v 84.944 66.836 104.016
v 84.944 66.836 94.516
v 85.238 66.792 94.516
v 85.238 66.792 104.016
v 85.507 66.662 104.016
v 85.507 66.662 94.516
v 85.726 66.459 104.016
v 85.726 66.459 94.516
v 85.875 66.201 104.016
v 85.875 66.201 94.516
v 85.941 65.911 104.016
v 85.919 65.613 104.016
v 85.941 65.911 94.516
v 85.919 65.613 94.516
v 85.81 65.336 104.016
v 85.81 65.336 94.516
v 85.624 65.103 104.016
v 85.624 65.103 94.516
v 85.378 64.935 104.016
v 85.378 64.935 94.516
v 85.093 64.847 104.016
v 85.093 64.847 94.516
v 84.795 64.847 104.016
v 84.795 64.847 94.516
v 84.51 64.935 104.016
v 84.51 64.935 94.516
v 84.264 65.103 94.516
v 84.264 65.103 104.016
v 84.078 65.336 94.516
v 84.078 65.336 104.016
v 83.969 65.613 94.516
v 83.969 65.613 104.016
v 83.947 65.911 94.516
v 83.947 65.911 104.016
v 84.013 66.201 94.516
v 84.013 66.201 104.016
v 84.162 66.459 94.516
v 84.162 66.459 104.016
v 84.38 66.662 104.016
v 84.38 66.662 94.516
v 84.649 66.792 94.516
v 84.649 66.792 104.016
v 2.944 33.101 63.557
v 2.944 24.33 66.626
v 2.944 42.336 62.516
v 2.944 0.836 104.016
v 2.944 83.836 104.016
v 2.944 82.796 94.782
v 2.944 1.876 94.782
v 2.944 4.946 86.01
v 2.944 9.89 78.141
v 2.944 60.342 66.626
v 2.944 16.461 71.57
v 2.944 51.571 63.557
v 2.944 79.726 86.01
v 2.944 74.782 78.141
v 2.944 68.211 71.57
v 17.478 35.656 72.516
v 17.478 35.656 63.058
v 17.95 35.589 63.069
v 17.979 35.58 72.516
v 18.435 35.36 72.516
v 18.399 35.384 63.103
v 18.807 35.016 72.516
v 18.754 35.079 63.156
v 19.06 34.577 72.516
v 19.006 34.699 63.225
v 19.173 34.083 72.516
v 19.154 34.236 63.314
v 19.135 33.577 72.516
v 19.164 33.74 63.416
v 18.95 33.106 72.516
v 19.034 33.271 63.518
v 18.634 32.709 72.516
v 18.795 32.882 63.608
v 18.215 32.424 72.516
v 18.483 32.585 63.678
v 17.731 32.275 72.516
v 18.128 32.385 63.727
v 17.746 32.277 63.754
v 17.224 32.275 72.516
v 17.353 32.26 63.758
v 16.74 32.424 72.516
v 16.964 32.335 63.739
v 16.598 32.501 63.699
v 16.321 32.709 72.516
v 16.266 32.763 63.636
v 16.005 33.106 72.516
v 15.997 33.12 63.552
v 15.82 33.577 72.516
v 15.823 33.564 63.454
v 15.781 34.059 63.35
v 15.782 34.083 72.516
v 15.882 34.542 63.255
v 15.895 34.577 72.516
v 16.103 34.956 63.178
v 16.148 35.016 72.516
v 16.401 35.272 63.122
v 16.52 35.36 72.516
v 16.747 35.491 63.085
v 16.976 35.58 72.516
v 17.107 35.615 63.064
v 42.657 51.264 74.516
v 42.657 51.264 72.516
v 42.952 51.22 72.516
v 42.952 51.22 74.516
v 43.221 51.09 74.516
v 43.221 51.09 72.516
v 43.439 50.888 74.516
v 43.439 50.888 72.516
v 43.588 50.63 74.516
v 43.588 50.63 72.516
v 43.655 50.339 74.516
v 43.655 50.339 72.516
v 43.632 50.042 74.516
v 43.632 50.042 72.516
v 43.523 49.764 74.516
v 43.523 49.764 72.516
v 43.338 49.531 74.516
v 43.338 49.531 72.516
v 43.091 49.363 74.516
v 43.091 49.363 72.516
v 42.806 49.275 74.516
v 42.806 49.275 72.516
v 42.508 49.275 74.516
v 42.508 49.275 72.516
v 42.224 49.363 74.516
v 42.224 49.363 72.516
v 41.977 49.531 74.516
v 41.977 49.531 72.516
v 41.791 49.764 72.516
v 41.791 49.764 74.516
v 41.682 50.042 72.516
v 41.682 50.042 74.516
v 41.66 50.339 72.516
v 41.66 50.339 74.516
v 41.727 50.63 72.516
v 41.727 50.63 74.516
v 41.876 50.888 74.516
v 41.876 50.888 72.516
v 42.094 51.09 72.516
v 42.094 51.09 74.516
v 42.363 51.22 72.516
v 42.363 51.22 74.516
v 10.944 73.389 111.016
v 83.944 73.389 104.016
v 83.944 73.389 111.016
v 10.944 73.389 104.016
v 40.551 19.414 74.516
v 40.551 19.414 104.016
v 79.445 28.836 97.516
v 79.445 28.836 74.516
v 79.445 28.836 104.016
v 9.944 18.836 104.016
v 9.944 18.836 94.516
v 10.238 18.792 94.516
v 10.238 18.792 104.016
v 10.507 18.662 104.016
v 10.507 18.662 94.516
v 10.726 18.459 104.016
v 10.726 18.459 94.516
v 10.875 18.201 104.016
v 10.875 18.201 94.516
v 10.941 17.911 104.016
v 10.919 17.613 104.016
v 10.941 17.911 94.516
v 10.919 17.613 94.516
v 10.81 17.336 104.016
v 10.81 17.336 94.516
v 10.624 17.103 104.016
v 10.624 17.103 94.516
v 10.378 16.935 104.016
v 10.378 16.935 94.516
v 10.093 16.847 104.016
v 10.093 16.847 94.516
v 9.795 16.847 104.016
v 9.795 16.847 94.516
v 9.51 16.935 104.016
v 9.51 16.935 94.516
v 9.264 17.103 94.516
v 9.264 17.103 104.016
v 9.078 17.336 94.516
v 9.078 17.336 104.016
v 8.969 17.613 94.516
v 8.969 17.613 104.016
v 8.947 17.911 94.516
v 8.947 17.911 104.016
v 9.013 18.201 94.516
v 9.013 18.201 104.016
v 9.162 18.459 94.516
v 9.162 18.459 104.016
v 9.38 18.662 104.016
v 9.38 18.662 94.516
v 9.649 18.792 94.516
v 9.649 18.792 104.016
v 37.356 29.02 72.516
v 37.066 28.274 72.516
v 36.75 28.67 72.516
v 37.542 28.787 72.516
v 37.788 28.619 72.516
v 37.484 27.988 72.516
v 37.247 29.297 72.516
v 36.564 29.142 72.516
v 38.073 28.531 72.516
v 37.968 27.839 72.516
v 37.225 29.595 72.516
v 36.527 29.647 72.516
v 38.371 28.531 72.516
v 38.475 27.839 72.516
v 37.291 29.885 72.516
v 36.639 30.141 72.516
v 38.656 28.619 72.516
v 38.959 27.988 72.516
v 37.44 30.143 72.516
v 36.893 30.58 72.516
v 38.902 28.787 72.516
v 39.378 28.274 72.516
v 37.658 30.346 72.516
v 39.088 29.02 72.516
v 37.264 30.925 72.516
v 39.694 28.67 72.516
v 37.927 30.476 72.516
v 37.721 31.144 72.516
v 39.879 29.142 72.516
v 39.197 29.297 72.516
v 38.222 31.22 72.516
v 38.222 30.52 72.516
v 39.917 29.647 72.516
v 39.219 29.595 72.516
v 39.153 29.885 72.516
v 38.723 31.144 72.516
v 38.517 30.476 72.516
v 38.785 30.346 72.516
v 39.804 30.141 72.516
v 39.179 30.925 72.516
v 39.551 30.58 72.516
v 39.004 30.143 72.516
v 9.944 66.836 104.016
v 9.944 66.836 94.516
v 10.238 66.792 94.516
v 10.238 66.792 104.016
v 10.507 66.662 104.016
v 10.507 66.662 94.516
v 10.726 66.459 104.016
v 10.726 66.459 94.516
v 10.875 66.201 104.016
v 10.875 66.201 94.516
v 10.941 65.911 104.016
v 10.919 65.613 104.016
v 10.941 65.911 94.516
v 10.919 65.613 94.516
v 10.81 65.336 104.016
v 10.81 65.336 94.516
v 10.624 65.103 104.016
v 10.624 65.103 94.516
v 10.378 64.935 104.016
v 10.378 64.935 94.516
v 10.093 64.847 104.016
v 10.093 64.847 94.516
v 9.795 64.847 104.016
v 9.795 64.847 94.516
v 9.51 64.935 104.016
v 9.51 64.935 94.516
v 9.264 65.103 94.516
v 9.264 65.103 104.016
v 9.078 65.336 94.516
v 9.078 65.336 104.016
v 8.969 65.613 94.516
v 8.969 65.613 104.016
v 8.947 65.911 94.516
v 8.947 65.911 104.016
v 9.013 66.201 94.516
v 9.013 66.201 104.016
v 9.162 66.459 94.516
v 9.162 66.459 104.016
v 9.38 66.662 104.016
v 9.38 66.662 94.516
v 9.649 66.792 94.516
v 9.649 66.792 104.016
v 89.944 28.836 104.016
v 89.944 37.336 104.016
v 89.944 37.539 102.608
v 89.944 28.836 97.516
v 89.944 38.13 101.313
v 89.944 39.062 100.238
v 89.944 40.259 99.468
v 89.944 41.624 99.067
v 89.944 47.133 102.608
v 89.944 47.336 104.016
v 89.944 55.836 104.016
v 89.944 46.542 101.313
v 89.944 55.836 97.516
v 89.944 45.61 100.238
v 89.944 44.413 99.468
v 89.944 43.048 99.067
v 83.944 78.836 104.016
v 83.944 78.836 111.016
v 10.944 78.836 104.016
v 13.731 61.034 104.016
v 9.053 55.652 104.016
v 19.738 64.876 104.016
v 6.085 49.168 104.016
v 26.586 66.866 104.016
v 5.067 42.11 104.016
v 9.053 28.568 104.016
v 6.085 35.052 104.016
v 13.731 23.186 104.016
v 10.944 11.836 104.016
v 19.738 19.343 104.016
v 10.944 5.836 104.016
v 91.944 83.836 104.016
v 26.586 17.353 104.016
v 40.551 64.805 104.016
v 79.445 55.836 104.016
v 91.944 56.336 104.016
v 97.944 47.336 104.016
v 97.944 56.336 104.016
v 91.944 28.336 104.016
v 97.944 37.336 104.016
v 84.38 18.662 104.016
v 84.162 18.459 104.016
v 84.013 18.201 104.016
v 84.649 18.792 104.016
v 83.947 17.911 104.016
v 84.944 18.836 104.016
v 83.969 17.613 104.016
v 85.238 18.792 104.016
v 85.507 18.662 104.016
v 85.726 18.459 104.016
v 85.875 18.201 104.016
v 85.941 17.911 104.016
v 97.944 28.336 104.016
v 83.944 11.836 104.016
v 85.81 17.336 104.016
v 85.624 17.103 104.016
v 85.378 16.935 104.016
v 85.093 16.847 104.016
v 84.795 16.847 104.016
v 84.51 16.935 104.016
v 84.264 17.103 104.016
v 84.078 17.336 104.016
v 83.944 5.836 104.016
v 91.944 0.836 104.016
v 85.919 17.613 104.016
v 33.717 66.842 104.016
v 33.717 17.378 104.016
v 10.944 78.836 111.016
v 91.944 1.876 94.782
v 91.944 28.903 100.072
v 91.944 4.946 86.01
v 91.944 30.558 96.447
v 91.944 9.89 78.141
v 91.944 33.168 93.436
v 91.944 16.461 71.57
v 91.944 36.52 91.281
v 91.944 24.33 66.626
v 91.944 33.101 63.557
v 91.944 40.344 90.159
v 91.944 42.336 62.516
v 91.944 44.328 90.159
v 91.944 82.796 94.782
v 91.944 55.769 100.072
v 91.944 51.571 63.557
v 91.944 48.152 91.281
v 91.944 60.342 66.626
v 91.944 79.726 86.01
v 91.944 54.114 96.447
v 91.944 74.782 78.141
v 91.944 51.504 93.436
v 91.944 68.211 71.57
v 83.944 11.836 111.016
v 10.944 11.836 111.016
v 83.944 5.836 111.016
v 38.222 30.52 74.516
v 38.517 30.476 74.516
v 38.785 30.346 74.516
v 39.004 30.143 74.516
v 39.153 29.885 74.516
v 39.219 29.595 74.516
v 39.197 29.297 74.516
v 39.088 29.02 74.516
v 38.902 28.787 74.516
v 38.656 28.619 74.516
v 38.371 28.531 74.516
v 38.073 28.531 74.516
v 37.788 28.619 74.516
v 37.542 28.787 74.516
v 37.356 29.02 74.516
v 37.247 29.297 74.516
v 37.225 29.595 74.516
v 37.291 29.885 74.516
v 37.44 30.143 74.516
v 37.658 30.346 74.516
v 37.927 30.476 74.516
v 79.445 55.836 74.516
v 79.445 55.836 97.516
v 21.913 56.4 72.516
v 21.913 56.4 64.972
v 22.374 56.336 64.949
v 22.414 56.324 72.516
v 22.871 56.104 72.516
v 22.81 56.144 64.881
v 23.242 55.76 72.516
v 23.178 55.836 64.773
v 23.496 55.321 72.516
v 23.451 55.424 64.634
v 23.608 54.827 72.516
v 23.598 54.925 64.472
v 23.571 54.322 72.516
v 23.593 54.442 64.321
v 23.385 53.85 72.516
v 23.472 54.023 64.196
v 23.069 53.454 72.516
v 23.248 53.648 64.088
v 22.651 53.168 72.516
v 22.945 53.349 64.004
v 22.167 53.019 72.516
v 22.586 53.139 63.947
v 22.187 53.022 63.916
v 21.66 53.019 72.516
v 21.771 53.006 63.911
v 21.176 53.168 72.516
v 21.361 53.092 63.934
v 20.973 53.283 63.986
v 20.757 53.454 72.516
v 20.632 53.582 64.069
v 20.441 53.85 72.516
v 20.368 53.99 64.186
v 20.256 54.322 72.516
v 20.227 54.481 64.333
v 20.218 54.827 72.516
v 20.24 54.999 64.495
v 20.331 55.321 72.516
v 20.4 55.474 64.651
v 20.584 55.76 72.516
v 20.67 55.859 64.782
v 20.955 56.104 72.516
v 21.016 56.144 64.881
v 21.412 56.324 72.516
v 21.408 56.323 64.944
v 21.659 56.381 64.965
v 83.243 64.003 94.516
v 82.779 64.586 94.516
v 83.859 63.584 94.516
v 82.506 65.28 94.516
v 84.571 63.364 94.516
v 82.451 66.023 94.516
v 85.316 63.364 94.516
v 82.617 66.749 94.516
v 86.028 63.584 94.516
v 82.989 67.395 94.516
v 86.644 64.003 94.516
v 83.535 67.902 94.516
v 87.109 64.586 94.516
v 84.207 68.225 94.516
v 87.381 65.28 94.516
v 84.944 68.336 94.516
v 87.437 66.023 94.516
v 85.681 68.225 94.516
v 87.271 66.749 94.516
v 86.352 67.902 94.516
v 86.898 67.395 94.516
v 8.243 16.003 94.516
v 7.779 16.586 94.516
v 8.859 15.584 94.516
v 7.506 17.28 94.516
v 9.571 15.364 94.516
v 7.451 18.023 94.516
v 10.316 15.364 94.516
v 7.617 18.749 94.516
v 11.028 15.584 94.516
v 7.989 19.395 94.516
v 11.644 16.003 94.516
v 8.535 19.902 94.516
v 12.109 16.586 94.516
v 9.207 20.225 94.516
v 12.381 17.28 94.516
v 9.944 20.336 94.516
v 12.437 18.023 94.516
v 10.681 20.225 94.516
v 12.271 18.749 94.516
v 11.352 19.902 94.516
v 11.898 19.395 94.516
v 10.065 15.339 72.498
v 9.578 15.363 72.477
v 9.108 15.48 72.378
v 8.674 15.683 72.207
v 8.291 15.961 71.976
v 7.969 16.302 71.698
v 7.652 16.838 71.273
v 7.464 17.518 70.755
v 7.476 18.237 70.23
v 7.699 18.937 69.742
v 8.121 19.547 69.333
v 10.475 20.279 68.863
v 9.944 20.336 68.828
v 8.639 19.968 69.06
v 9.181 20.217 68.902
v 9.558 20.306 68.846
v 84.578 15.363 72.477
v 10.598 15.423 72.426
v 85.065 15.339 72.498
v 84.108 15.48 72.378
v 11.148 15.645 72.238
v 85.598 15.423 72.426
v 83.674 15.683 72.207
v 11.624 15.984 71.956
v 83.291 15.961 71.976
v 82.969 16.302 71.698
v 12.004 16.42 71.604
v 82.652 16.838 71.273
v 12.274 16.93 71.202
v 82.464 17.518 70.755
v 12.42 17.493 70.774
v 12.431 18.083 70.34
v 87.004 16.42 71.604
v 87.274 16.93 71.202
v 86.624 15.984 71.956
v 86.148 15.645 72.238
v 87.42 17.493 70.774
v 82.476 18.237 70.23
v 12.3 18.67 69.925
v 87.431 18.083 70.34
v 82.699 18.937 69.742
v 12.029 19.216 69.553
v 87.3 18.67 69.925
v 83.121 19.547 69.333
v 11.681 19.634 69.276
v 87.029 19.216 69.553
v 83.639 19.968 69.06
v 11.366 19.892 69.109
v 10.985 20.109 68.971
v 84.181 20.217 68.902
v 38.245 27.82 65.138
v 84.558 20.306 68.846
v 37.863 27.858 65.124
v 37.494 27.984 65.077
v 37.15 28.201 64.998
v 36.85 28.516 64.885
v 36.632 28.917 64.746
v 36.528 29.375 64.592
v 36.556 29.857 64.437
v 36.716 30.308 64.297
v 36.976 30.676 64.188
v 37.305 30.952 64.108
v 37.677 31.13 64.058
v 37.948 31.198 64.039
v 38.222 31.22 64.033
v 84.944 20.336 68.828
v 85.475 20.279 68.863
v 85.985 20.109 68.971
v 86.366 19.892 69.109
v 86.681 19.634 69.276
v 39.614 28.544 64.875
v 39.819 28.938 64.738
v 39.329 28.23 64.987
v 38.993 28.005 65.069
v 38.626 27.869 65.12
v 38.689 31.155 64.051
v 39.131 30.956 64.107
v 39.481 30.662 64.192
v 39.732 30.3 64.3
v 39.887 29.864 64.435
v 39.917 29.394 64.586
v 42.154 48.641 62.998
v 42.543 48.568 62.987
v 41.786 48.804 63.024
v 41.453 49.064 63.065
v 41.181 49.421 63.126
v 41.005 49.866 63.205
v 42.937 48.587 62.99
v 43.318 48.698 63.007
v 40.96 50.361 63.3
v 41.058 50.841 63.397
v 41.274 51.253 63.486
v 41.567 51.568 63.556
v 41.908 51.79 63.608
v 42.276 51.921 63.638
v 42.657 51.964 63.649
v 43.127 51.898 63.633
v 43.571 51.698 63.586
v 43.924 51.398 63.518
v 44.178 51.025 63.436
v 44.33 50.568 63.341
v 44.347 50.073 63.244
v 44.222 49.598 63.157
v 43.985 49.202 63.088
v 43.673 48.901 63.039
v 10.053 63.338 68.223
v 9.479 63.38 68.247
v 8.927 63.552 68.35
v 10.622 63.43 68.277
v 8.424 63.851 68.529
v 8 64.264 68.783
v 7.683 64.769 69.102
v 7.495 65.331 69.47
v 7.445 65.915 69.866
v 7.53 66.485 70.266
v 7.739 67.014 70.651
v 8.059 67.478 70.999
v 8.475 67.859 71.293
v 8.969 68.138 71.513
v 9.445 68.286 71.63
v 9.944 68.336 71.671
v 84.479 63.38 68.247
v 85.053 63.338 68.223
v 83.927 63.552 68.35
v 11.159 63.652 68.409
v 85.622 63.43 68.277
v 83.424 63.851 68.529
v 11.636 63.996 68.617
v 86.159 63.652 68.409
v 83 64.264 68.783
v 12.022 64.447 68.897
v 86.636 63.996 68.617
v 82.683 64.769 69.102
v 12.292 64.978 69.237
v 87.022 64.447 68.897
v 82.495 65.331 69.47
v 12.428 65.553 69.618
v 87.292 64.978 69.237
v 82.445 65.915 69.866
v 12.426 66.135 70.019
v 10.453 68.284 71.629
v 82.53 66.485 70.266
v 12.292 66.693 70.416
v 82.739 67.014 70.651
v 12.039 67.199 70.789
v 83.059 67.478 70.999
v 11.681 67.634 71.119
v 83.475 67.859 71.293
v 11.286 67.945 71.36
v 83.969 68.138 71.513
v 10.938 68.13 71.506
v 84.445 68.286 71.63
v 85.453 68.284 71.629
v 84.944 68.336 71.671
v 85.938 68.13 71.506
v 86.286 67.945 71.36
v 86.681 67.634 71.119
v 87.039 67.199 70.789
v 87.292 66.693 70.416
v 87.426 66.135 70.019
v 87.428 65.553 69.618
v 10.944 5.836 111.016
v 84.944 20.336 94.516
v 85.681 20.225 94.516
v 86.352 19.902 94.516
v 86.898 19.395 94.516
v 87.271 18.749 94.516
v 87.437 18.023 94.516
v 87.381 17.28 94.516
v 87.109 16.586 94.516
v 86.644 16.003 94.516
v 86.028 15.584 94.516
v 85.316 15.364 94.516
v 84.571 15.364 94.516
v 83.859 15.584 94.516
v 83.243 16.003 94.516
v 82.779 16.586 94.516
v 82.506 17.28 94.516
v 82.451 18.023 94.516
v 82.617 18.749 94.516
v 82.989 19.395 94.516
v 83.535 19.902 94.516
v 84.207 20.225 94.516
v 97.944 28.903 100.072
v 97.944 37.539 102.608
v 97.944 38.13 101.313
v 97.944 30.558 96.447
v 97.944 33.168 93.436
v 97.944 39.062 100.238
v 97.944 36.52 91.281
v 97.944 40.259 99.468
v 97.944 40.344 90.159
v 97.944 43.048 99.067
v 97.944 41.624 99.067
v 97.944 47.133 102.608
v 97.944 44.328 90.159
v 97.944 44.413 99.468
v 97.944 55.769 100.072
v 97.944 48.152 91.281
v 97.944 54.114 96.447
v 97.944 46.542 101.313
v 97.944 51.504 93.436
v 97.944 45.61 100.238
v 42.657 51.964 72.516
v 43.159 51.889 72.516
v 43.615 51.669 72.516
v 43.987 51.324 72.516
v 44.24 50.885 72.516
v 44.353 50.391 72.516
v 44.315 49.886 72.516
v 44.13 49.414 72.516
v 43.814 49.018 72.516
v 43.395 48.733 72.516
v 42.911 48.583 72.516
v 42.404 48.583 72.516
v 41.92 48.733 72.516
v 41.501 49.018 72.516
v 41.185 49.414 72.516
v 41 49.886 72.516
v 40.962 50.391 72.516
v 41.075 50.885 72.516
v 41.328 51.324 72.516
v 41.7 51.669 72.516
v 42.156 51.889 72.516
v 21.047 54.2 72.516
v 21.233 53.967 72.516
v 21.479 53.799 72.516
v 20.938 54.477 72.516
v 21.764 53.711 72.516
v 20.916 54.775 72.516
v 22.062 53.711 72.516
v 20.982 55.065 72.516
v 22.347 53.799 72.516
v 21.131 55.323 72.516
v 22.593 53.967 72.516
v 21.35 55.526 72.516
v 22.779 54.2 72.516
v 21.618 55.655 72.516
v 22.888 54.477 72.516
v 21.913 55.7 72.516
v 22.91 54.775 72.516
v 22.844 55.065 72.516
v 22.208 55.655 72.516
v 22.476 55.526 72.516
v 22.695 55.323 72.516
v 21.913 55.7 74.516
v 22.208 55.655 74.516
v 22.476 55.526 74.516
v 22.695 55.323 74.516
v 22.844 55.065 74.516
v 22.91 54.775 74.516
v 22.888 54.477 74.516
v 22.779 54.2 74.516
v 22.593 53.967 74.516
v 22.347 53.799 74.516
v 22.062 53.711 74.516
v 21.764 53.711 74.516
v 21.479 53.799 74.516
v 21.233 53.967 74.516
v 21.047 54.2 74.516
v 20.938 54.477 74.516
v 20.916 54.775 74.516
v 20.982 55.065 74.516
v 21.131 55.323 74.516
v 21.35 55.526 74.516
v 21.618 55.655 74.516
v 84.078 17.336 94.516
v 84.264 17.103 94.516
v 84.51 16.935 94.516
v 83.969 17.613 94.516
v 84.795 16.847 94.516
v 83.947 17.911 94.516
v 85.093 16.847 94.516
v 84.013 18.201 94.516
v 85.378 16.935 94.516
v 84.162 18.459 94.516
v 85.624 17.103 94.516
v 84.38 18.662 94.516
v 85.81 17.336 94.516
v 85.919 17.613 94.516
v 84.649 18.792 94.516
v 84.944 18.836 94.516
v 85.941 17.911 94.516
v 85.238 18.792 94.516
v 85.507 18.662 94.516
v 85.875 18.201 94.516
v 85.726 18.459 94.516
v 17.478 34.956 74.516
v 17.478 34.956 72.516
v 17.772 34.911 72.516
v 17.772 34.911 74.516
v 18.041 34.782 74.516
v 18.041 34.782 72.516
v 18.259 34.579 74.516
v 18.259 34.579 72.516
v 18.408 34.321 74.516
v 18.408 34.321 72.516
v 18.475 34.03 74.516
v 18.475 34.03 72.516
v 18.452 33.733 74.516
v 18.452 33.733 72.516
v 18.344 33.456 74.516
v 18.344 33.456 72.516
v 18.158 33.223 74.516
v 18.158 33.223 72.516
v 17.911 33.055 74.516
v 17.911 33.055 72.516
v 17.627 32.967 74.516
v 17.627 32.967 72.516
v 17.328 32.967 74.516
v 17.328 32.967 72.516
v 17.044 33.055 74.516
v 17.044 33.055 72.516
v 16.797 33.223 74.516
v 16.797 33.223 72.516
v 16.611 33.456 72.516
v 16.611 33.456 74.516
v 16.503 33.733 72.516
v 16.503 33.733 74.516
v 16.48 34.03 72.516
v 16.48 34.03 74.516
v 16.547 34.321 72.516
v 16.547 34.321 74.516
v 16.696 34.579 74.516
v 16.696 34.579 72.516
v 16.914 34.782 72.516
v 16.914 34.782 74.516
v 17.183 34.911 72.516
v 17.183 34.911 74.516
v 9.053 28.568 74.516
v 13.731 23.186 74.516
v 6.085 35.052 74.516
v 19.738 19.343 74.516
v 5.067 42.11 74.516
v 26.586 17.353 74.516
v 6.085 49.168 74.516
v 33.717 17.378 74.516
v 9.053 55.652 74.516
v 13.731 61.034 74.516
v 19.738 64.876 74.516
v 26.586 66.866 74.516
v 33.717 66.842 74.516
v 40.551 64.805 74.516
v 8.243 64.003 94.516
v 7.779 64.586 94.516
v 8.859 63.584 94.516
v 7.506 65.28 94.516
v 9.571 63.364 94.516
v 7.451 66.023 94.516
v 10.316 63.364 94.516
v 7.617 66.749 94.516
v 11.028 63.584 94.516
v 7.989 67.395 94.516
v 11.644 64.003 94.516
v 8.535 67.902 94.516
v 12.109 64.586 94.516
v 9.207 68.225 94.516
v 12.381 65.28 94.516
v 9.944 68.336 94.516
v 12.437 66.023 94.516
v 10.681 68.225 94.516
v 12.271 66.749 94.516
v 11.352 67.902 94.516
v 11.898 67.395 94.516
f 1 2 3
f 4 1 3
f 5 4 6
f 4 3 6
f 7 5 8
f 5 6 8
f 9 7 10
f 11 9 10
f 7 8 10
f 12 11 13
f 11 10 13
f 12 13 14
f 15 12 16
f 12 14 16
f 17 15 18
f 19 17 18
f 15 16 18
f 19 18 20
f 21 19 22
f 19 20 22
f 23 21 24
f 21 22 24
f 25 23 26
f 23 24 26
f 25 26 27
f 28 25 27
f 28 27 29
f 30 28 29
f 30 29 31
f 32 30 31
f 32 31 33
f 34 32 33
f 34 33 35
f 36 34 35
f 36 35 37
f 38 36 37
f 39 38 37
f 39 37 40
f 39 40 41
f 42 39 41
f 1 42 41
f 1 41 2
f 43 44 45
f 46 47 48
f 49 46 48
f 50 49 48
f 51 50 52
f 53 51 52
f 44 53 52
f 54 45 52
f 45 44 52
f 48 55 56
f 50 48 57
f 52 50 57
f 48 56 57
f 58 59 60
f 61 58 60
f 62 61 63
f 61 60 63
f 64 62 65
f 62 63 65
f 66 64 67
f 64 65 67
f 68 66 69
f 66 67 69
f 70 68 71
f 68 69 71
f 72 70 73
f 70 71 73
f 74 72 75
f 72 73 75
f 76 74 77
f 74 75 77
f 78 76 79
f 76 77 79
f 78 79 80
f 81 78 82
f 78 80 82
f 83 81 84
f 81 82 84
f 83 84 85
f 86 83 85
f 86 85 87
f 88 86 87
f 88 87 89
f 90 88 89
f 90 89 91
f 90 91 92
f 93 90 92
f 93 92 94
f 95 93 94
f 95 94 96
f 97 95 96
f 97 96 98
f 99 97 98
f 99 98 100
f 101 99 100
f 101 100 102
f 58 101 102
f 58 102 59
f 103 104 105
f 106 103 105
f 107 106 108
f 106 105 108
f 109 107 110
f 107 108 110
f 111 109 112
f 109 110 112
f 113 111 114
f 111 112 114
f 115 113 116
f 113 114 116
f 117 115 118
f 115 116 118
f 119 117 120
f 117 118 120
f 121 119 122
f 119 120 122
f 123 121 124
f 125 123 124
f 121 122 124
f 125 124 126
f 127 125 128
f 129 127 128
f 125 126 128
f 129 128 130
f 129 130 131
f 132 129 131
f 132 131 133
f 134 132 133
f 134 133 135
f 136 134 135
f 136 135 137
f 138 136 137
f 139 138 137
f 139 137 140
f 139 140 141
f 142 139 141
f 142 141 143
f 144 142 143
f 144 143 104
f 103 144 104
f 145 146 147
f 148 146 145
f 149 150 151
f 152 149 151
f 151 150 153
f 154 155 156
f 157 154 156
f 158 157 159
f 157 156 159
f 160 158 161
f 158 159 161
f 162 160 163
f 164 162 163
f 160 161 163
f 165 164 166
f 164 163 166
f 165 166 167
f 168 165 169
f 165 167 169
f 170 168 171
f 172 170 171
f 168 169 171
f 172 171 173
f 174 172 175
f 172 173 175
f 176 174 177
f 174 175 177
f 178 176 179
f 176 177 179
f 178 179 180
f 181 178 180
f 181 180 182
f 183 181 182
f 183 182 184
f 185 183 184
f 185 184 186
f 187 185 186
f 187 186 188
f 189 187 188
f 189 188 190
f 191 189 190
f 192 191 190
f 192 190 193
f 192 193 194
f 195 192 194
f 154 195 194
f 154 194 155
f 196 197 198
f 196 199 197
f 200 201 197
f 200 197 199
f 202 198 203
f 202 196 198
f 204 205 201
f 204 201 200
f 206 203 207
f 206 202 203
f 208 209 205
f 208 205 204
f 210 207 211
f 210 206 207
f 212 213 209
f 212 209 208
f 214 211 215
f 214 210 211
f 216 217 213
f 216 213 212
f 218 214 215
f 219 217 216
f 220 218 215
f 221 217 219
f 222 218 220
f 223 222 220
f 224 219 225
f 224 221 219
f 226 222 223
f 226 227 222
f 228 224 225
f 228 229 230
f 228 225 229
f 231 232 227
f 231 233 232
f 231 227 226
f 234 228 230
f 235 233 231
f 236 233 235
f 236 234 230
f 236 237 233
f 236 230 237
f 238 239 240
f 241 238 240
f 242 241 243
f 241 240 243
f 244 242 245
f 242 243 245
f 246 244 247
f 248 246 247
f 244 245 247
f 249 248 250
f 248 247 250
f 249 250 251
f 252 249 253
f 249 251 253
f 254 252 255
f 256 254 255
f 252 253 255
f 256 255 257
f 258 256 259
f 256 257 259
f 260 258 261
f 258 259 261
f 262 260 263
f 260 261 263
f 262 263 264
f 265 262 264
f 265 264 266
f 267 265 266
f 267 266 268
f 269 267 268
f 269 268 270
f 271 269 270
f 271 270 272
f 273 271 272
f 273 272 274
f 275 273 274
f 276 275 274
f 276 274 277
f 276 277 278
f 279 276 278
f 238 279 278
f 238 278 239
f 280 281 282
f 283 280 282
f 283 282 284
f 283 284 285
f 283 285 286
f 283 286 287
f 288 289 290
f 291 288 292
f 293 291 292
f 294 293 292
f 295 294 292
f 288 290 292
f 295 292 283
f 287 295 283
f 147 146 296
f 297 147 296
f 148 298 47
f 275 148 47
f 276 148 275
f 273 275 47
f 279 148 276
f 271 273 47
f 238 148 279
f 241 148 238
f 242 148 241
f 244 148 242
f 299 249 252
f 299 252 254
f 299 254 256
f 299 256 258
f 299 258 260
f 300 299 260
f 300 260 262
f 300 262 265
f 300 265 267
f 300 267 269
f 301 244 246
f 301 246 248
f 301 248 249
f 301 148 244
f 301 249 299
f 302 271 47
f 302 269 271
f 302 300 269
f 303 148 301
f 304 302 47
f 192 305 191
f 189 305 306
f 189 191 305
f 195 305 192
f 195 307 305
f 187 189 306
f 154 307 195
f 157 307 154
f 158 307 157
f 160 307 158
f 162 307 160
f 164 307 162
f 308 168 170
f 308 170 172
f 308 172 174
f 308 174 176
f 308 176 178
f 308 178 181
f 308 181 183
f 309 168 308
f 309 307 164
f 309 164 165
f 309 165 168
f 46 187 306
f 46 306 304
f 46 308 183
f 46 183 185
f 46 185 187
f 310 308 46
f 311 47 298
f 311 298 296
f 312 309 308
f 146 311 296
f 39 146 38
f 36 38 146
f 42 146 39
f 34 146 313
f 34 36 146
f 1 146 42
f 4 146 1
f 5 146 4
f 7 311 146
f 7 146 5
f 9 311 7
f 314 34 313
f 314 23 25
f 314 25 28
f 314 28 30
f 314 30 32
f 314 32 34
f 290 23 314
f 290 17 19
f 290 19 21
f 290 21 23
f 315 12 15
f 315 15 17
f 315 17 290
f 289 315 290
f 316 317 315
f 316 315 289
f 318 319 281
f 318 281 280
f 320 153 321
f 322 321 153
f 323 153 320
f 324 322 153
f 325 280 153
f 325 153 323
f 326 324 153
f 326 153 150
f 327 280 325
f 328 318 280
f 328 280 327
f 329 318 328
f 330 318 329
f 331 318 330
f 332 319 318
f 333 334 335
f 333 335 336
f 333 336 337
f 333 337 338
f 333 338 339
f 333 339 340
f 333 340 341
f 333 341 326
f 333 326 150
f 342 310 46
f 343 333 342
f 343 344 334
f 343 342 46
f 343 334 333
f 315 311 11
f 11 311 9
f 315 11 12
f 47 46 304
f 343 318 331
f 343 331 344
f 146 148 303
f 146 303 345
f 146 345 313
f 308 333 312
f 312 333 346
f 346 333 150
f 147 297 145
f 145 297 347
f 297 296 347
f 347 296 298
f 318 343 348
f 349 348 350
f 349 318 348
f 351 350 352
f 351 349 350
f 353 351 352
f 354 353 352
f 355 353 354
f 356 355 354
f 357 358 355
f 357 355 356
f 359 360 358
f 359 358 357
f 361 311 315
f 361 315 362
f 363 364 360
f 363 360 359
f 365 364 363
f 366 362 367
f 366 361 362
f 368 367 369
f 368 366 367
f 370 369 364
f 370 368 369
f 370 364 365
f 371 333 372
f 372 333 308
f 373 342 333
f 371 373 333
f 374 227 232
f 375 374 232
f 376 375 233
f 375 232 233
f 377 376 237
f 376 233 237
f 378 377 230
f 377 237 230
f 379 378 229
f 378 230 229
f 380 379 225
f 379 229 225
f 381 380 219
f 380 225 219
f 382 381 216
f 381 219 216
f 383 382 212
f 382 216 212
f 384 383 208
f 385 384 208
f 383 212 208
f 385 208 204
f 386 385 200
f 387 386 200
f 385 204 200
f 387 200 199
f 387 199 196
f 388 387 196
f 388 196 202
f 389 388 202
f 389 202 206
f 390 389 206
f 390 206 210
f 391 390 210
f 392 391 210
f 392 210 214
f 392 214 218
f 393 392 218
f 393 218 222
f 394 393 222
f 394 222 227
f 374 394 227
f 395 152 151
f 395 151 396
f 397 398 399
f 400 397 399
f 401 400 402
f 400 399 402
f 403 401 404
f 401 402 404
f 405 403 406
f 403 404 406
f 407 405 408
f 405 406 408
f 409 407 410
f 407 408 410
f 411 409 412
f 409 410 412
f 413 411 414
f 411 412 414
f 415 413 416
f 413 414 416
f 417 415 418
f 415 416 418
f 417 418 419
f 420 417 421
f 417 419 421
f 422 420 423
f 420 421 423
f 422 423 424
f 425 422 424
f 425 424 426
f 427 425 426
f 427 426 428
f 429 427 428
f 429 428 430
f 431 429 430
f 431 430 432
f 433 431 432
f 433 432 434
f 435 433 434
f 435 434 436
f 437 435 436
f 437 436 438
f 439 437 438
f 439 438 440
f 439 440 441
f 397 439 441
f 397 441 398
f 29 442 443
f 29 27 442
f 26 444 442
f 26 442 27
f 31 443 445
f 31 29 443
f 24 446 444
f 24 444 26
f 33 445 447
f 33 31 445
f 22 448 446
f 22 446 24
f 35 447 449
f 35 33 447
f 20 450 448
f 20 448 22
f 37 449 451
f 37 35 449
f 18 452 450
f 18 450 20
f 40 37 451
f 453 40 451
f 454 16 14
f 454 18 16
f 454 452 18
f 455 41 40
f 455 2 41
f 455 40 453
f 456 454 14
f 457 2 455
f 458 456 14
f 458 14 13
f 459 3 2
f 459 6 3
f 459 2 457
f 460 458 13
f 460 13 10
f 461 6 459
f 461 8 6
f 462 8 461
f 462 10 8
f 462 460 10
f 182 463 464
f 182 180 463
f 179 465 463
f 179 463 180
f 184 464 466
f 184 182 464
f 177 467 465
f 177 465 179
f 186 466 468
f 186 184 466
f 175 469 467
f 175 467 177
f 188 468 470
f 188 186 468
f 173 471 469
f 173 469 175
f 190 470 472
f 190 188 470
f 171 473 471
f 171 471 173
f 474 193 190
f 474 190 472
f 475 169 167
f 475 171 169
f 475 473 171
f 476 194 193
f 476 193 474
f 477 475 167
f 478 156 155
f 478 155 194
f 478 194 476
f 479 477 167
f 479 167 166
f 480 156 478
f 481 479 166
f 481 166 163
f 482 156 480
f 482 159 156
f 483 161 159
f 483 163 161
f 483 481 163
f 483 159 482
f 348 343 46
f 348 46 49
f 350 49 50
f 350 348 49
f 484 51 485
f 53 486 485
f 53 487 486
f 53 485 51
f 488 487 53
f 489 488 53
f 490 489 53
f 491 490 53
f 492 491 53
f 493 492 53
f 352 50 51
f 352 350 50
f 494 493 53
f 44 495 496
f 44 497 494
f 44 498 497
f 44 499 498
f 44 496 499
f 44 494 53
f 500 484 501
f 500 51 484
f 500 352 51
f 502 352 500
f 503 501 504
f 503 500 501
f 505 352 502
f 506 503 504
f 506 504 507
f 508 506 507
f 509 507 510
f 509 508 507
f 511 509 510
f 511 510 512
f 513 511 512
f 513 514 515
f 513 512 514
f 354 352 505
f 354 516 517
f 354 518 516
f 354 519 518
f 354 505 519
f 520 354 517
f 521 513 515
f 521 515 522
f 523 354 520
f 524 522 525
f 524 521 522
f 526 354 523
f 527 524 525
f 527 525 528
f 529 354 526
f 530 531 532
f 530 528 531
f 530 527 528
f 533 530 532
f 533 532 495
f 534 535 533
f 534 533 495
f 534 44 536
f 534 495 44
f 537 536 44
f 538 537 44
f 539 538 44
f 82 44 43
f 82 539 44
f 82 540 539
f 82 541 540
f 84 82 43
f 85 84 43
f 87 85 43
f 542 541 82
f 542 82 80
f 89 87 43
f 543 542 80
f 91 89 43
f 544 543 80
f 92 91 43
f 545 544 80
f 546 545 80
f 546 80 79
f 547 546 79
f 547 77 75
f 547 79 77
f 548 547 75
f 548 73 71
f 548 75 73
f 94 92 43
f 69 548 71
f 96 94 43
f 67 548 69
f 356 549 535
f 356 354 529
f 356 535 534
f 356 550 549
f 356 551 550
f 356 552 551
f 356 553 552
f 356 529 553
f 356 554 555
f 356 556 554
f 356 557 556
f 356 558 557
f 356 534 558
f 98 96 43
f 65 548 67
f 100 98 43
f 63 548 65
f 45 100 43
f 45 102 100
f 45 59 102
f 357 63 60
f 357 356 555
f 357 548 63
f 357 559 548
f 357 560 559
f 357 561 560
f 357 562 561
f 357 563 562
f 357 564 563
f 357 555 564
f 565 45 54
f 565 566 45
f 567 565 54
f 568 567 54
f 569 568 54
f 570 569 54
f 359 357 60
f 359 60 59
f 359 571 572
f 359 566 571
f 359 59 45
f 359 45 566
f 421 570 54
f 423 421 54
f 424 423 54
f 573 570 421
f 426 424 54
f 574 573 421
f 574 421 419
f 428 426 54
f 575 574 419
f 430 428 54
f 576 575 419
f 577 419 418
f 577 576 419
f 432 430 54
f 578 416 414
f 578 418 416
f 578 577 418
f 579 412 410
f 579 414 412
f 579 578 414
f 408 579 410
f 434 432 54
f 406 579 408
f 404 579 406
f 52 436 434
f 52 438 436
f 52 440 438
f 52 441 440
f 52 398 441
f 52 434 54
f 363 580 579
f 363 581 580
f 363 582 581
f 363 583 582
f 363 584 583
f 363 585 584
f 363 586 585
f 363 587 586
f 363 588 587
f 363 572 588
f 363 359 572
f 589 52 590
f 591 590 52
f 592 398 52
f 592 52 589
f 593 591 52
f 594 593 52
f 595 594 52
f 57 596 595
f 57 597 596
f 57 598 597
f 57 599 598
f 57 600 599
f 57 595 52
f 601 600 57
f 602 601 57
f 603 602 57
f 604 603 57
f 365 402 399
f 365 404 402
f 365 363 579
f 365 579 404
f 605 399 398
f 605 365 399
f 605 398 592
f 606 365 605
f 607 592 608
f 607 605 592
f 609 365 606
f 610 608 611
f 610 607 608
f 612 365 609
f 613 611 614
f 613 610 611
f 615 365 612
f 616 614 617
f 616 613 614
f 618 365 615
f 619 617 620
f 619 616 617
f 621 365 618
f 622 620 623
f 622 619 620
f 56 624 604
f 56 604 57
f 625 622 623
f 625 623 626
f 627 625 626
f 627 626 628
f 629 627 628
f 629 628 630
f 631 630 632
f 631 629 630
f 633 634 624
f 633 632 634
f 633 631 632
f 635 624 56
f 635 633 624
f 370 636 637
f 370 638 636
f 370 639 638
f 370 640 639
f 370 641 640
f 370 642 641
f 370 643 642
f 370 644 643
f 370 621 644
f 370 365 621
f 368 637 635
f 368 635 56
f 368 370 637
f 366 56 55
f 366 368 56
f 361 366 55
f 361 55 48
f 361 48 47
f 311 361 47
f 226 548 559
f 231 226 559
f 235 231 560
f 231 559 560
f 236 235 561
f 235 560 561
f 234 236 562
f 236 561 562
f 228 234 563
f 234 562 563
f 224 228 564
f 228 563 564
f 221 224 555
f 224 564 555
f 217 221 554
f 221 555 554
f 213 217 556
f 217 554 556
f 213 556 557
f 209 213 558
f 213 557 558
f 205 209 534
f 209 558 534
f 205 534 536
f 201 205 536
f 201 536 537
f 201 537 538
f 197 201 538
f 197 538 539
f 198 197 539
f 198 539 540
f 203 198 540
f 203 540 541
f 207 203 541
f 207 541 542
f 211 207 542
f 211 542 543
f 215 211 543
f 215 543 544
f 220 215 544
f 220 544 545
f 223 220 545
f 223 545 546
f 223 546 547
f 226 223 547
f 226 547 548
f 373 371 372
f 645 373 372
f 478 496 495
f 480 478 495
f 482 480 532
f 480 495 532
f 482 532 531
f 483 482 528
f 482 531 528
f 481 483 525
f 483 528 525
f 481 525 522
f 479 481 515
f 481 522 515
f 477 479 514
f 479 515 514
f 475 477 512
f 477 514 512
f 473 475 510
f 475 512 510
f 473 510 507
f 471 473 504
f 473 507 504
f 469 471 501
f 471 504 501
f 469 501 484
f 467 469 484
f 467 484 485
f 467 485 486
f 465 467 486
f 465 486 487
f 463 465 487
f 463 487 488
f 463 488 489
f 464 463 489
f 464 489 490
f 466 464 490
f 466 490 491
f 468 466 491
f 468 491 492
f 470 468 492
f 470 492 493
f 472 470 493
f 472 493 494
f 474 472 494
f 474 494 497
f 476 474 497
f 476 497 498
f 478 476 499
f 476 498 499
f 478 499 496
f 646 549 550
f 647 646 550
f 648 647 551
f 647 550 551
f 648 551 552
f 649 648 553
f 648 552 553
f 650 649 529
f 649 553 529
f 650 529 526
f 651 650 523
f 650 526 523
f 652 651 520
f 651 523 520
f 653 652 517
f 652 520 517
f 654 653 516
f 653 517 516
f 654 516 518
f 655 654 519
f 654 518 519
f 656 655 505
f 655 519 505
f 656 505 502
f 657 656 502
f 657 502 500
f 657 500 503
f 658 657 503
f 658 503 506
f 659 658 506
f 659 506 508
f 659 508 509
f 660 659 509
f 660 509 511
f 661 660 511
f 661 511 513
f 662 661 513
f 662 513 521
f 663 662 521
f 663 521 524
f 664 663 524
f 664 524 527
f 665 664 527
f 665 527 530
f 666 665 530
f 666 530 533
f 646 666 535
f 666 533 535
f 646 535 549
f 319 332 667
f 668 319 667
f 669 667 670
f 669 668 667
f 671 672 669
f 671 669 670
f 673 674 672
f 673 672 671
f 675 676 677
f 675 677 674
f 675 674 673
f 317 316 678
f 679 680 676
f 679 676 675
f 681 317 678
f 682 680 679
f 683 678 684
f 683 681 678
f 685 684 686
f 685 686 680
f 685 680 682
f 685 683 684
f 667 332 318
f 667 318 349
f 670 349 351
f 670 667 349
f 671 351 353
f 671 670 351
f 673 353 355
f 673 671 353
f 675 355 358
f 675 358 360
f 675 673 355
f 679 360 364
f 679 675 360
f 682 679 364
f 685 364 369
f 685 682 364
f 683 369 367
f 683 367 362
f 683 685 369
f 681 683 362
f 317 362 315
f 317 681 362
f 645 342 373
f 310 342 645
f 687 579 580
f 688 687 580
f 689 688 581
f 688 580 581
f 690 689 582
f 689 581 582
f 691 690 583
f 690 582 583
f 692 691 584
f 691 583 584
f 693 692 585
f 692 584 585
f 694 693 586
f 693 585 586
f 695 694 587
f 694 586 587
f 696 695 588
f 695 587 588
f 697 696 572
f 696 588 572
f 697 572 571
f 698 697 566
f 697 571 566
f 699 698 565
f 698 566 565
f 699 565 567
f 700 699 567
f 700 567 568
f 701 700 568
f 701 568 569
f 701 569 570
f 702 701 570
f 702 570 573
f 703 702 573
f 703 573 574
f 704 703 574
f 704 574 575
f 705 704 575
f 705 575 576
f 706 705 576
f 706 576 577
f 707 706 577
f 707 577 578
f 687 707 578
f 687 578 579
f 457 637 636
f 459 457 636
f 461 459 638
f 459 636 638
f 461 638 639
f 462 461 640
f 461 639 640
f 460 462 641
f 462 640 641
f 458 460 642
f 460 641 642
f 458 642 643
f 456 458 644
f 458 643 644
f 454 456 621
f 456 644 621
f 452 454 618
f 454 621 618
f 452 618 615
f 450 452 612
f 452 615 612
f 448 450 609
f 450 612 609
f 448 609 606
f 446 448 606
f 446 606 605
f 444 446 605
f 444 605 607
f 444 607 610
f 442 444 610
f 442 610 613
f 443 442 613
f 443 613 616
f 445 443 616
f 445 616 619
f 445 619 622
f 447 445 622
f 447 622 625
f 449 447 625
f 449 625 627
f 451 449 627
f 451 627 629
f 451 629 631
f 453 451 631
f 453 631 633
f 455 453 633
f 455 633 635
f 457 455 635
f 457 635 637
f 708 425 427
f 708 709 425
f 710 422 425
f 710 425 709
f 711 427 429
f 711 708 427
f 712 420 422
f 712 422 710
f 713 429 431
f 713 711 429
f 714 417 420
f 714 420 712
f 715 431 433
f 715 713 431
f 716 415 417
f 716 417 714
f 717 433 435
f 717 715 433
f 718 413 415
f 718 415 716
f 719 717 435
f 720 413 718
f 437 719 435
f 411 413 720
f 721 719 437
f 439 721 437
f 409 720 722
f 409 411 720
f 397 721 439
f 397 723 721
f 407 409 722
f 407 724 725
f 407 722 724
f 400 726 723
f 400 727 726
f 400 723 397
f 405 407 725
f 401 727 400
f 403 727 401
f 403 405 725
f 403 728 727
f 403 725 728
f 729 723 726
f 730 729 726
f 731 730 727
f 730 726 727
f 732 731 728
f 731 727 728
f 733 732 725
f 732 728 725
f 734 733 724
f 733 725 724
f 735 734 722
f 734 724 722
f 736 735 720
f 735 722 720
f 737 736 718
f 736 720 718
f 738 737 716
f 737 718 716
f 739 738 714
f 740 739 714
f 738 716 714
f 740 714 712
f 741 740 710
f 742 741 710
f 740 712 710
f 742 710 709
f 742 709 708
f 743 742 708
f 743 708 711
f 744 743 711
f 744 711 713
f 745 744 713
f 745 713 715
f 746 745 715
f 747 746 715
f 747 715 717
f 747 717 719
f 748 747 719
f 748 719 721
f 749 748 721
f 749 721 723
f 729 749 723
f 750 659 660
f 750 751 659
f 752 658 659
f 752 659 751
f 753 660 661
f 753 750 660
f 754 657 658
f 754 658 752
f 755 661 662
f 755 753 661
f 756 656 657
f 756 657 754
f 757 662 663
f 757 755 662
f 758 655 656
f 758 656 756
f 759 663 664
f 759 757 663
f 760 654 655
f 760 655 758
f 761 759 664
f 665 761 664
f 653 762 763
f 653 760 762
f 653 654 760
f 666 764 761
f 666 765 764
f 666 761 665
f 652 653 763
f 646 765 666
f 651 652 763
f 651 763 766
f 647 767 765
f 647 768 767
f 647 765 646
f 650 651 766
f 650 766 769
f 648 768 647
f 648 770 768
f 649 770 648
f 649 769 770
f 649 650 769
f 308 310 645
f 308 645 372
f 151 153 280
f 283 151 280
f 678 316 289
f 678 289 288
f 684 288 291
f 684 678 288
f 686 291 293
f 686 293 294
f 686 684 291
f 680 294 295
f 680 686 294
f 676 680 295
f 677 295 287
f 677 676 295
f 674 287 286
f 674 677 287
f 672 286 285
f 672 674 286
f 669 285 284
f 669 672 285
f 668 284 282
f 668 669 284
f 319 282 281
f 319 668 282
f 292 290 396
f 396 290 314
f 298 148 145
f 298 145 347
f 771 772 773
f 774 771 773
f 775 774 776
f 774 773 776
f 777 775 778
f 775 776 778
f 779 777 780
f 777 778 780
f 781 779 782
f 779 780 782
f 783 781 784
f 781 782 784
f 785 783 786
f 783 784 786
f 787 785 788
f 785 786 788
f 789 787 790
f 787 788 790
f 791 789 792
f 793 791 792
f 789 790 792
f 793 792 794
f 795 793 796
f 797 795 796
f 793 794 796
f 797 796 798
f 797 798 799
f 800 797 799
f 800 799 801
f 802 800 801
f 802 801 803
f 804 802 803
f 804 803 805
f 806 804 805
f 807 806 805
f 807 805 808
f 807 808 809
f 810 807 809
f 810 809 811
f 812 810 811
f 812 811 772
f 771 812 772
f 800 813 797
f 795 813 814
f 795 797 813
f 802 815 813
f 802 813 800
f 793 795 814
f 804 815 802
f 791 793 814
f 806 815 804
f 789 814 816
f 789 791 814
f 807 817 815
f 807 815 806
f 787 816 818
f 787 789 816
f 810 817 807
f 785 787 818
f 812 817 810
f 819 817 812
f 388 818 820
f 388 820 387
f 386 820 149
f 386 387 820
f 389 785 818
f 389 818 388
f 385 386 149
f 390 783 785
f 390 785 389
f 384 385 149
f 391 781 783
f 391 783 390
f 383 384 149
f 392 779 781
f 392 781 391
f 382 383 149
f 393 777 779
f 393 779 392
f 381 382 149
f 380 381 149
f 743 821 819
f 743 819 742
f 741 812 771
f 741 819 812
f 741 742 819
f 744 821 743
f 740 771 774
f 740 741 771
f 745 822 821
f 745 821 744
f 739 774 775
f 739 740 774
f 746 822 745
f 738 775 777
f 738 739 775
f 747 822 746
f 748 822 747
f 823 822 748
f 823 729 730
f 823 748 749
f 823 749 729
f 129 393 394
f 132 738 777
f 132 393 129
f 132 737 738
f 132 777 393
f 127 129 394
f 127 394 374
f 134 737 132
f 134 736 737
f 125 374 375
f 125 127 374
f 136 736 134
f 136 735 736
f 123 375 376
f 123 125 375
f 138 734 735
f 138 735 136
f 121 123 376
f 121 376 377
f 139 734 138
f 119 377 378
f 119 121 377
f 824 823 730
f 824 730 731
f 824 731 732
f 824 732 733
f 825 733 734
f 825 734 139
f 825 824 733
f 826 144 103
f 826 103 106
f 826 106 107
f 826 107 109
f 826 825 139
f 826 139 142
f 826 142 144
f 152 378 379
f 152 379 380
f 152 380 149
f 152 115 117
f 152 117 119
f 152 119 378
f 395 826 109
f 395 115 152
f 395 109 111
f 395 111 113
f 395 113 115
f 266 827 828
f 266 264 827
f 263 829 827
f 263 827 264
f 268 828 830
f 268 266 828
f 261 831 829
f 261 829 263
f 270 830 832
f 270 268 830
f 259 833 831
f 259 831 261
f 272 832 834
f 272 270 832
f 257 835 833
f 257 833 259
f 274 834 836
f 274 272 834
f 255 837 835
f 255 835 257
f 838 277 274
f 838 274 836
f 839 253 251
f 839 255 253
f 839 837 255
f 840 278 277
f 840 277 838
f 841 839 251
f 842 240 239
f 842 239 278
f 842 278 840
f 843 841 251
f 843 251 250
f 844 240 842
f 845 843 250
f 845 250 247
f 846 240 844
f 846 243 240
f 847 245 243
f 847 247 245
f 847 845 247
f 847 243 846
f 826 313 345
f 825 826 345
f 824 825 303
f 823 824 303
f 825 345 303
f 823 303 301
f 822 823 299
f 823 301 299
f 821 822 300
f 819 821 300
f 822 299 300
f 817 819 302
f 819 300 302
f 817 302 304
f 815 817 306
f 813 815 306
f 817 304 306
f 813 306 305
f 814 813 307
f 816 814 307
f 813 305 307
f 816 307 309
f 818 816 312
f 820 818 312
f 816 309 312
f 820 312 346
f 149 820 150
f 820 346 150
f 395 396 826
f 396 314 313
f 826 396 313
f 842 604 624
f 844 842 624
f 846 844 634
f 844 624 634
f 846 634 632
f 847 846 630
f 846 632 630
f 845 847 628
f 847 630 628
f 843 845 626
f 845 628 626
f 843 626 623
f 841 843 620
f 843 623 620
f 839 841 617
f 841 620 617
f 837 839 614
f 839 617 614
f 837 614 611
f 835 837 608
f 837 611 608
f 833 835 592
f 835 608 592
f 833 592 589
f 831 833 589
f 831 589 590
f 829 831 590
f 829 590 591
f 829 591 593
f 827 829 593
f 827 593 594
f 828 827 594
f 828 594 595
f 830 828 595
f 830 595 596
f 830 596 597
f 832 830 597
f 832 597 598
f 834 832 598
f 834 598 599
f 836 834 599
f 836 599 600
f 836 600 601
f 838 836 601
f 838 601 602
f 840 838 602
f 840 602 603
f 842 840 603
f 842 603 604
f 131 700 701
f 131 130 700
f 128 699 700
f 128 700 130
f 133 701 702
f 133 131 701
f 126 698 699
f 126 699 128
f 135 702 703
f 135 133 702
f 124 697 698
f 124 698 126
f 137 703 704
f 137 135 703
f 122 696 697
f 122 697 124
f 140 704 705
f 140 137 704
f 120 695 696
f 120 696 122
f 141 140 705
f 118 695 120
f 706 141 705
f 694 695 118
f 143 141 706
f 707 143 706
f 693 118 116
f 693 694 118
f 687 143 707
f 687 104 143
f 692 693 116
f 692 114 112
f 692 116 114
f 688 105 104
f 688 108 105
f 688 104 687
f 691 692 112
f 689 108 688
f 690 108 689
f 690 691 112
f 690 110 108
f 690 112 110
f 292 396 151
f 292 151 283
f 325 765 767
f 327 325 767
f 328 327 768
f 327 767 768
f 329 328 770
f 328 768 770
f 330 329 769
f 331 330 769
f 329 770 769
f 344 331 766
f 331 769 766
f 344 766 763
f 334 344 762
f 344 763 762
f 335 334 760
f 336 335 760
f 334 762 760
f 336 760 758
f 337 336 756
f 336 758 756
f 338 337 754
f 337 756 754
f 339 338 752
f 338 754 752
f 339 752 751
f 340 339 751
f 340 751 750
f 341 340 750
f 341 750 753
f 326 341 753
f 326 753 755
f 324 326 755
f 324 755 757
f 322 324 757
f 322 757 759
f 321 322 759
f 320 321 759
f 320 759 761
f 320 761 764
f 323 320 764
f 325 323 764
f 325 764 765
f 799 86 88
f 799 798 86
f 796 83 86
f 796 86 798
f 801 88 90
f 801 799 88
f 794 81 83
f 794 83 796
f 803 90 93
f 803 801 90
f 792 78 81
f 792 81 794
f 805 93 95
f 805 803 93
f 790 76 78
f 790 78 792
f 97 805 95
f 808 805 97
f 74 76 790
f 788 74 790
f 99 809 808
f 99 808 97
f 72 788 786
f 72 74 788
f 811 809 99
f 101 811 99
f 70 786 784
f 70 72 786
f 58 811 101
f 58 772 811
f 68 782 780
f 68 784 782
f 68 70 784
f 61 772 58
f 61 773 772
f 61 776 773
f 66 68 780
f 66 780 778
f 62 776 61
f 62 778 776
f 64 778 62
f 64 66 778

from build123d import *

# Parameters (mm, degrees)
BOSS_EXTRUDE2_DEPTH = 87
CUT_EXTRUDE1_DEPTH  = 29.5
SKETCH3_R           = 1
CUT_EXTRUDE2_DEPTH  = 130.771336418
SKETCH4_R           = 1.7
CUT_EXTRUDE3_DEPTH  = 10
BOSS_EXTRUDE3_START = 2
BOSS_EXTRUDE3_DEPTH = 2
BOSS_EXTRUDE4_START = 6
BOSS_EXTRUDE4_DEPTH = 6
SKETCH7_W           = 73
SKETCH7_H           = 5.446782016
SKETCH7_H_2         = 6
CUT_EXTRUDE4_DEPTH  = 7
SKETCH8_R           = 1
CUT_EXTRUDE5_DEPTH  = 136.438914135
SKETCH9_R           = 2.5
CUT_EXTRUDE6_DEPTH  = 32
SKETCH11_W          = 10.498637593
SKETCH11_H          = 26.999999931
BOSS_EXTRUDE6_DEPTH = 23
SKETCH12_W          = 73
SKETCH12_H          = 6
SKETCH12_H_2        = 5.446782016
BOSS_EXTRUDE7_DEPTH = 14


with BuildPart() as part:
    # Sketch1 → Boss-Extrude2 (new body)
    with BuildSketch(Plane(origin=(89.94373008, 0, 0), x_dir=(0, 0, -1), z_dir=(1, 0, 0))):
        with BuildLine():
            Line((-104.016306216, 83.836001664), (-104.016306216, 0.836001664))
            ThreePointArc((-104.016306216, 0.836001664), (-62.516306216, 42.336001664), (-104.016306216, 83.836001664))
        make_face()
    extrude(amount=-BOSS_EXTRUDE2_DEPTH)

    # Sketch2 → Cut-Extrude1 (cut)
    with BuildSketch(Plane.XY.offset(104.016306216)):
        with BuildLine():
            Line((89.94373008, 55.836001595), (79.445092487, 55.836001664))
            Line((79.445092487, 55.836001664), (40.551337791, 64.805487997))
            ThreePointArc((40.551337791, 64.805487997), (5.067466824, 42.109927869), (40.551337791, 19.414367741))
            Line((40.551337791, 19.414367741), (79.445092487, 28.836001664))
            Line((79.445092487, 28.836001664), (89.94373008, 28.836001664))
            Line((89.94373008, 28.836001664), (89.94373008, 55.836001595))
        make_face()
    extrude(amount=-CUT_EXTRUDE1_DEPTH, mode=Mode.SUBTRACT)

    # Sketch3 → Cut-Extrude2 (cut, through all)
    with BuildSketch(Plane(origin=(0, 0, 62.516306216), x_dir=(-1, 0, 0), z_dir=(0, 0, -1))):
        with Locations(Location((-42.657418818, 50.264258545, 0), (0, 0, 90))):
            Circle(SKETCH3_R)
        with Locations(Location((-21.913136148, 54.699879864, 0), (0, 0, 90))):
            Circle(SKETCH3_R)
        with Locations(Location((-38.2217975, 29.519975875, 0), (0, 0, 90))):
            Circle(SKETCH3_R)
        with Locations(Location((-17.477514829, 33.955597193, 0), (0, 0, 90))):
            Circle(SKETCH3_R)
    extrude(amount=-CUT_EXTRUDE2_DEPTH, mode=Mode.SUBTRACT)

    # Sketch4 → Cut-Extrude3 (cut)
    with BuildSketch(Plane(origin=(0, 0, 62.516306216), x_dir=(-1, 0, 0), z_dir=(0, 0, -1))):
        with Locations(Location((-42.657418818, 50.264258545, 0), (0, 0, 90))):
            Circle(SKETCH4_R)
        with Locations(Location((-21.913136148, 54.699879864, 0), (0, 0, 90))):
            Circle(SKETCH4_R)
        with Locations(Location((-38.2217975, 29.519975875, 0), (0, 0, 90))):
            Circle(SKETCH4_R)
        with Locations(Location((-17.477514829, 33.955597193, 0), (0, 0, 90))):
            Circle(SKETCH4_R)
    extrude(amount=-CUT_EXTRUDE3_DEPTH, mode=Mode.SUBTRACT)

    # Sketch5 → Boss-Extrude3 (add)
    with BuildSketch(Plane(origin=(89.94373008, 0, 0), x_dir=(0, 0, -1), z_dir=(1, 0, 0)).offset(BOSS_EXTRUDE3_START)):
        with BuildLine():
            Line((-104.016306216, 55.836001595), (-104.016306216, 47.336001664))
            ThreePointArc((-104.016306216, 47.336001664), (-99.016306216, 42.336001664), (-104.016306216, 37.336001664))
            Line((-104.016306216, 37.336001664), (-104.016306216, 28.836001664))
            Line((-104.016306216, 28.836001664), (-104.016306216, 0.836001664))
            ThreePointArc((-104.016306216, 0.836001664), (-62.516306216, 42.336001664), (-104.016306216, 83.836001664))
            Line((-104.016306216, 83.836001664), (-104.016306216, 55.836001595))
        make_face()
    extrude(amount=-BOSS_EXTRUDE3_DEPTH)

    # Sketch6 → Boss-Extrude4 (add)
    with BuildSketch(Plane(origin=(91.94373008, 0, 0), x_dir=(0, 0, -1), z_dir=(1, 0, 0)).offset(BOSS_EXTRUDE4_START)):
        with BuildLine():
            Line((-104.016306216, 56.336001664), (-104.016306216, 47.336001664))
            ThreePointArc((-104.016306216, 47.336001664), (-99.016306216, 42.336001664), (-104.016306216, 37.336001664))
            Line((-104.016306216, 37.336001664), (-104.016306216, 28.336001664))
            ThreePointArc((-104.016306216, 28.336001664), (-90.016306216, 42.336001664), (-104.016306216, 56.336001664))
        make_face()
    extrude(amount=-BOSS_EXTRUDE4_DEPTH)

    # Sketch7 → Cut-Extrude4 (cut)
    with BuildSketch(Plane.XY.offset(104.016306216)):
        with Locations((47.44373008, 76.112610656)):
            Rectangle(SKETCH7_W, SKETCH7_H)
        with Locations((47.44373008, 8.836001664)):
            Rectangle(SKETCH7_W, SKETCH7_H_2)
    extrude(amount=-CUT_EXTRUDE4_DEPTH, mode=Mode.SUBTRACT)

    # Sketch8 → Cut-Extrude5 (cut, through all)
    with BuildSketch(Plane(origin=(0, 0, 62.516306216), x_dir=(-1, 0, 0), z_dir=(0, 0, -1))):
        with Locations(Location((-84.94373008, 65.836001664, 0), (0, 0, 90))):
            Circle(SKETCH8_R)
        with Locations(Location((-84.94373008, 17.836001664, 0), (0, 0, 90))):
            Circle(SKETCH8_R)
        with Locations(Location((-9.94373008, 65.836001664, 0), (0, 0, 90))):
            Circle(SKETCH8_R)
        with Locations(Location((-9.94373008, 17.836001664, 0), (0, 0, 90))):
            Circle(SKETCH8_R)
    extrude(amount=-CUT_EXTRUDE5_DEPTH, mode=Mode.SUBTRACT)

    # Sketch9 → Cut-Extrude6 (cut)
    with BuildSketch(Plane(origin=(0, 0, 62.516306216), x_dir=(-1, 0, 0), z_dir=(0, 0, -1))):
        with Locations(Location((-84.94373008, 65.836001664, 0), (0, 0, 90))):
            Circle(SKETCH9_R)
        with Locations(Location((-84.94373008, 17.836001664, 0), (0, 0, 90))):
            Circle(SKETCH9_R)
        with Locations(Location((-9.94373008, 65.836001664, 0), (0, 0, 90))):
            Circle(SKETCH9_R)
        with Locations(Location((-9.94373008, 17.836001664, 0), (0, 0, 90))):
            Circle(SKETCH9_R)
    extrude(amount=-CUT_EXTRUDE6_DEPTH, mode=Mode.SUBTRACT)

    # Sketch11 → Boss-Extrude6 (add)
    with BuildSketch(Plane.XY.offset(74.516306216)):
        with Locations((84.694411284, 42.33600163)):
            Rectangle(SKETCH11_W, SKETCH11_H)
    extrude(amount=BOSS_EXTRUDE6_DEPTH)

    # Sketch12 → Boss-Extrude7 (add)
    with BuildSketch(Plane(origin=(0, 0, 97.016306216), x_dir=(-1, 0, 0), z_dir=(0, 0, -1))):
        with Locations((-47.44373008, 8.836001664)):
            Rectangle(SKETCH12_W, SKETCH12_H)
        with Locations((-47.44373008, 76.112610656)):
            Rectangle(SKETCH12_W, SKETCH12_H_2)
    extrude(amount=-BOSS_EXTRUDE7_DEPTH)


solid = part.part
